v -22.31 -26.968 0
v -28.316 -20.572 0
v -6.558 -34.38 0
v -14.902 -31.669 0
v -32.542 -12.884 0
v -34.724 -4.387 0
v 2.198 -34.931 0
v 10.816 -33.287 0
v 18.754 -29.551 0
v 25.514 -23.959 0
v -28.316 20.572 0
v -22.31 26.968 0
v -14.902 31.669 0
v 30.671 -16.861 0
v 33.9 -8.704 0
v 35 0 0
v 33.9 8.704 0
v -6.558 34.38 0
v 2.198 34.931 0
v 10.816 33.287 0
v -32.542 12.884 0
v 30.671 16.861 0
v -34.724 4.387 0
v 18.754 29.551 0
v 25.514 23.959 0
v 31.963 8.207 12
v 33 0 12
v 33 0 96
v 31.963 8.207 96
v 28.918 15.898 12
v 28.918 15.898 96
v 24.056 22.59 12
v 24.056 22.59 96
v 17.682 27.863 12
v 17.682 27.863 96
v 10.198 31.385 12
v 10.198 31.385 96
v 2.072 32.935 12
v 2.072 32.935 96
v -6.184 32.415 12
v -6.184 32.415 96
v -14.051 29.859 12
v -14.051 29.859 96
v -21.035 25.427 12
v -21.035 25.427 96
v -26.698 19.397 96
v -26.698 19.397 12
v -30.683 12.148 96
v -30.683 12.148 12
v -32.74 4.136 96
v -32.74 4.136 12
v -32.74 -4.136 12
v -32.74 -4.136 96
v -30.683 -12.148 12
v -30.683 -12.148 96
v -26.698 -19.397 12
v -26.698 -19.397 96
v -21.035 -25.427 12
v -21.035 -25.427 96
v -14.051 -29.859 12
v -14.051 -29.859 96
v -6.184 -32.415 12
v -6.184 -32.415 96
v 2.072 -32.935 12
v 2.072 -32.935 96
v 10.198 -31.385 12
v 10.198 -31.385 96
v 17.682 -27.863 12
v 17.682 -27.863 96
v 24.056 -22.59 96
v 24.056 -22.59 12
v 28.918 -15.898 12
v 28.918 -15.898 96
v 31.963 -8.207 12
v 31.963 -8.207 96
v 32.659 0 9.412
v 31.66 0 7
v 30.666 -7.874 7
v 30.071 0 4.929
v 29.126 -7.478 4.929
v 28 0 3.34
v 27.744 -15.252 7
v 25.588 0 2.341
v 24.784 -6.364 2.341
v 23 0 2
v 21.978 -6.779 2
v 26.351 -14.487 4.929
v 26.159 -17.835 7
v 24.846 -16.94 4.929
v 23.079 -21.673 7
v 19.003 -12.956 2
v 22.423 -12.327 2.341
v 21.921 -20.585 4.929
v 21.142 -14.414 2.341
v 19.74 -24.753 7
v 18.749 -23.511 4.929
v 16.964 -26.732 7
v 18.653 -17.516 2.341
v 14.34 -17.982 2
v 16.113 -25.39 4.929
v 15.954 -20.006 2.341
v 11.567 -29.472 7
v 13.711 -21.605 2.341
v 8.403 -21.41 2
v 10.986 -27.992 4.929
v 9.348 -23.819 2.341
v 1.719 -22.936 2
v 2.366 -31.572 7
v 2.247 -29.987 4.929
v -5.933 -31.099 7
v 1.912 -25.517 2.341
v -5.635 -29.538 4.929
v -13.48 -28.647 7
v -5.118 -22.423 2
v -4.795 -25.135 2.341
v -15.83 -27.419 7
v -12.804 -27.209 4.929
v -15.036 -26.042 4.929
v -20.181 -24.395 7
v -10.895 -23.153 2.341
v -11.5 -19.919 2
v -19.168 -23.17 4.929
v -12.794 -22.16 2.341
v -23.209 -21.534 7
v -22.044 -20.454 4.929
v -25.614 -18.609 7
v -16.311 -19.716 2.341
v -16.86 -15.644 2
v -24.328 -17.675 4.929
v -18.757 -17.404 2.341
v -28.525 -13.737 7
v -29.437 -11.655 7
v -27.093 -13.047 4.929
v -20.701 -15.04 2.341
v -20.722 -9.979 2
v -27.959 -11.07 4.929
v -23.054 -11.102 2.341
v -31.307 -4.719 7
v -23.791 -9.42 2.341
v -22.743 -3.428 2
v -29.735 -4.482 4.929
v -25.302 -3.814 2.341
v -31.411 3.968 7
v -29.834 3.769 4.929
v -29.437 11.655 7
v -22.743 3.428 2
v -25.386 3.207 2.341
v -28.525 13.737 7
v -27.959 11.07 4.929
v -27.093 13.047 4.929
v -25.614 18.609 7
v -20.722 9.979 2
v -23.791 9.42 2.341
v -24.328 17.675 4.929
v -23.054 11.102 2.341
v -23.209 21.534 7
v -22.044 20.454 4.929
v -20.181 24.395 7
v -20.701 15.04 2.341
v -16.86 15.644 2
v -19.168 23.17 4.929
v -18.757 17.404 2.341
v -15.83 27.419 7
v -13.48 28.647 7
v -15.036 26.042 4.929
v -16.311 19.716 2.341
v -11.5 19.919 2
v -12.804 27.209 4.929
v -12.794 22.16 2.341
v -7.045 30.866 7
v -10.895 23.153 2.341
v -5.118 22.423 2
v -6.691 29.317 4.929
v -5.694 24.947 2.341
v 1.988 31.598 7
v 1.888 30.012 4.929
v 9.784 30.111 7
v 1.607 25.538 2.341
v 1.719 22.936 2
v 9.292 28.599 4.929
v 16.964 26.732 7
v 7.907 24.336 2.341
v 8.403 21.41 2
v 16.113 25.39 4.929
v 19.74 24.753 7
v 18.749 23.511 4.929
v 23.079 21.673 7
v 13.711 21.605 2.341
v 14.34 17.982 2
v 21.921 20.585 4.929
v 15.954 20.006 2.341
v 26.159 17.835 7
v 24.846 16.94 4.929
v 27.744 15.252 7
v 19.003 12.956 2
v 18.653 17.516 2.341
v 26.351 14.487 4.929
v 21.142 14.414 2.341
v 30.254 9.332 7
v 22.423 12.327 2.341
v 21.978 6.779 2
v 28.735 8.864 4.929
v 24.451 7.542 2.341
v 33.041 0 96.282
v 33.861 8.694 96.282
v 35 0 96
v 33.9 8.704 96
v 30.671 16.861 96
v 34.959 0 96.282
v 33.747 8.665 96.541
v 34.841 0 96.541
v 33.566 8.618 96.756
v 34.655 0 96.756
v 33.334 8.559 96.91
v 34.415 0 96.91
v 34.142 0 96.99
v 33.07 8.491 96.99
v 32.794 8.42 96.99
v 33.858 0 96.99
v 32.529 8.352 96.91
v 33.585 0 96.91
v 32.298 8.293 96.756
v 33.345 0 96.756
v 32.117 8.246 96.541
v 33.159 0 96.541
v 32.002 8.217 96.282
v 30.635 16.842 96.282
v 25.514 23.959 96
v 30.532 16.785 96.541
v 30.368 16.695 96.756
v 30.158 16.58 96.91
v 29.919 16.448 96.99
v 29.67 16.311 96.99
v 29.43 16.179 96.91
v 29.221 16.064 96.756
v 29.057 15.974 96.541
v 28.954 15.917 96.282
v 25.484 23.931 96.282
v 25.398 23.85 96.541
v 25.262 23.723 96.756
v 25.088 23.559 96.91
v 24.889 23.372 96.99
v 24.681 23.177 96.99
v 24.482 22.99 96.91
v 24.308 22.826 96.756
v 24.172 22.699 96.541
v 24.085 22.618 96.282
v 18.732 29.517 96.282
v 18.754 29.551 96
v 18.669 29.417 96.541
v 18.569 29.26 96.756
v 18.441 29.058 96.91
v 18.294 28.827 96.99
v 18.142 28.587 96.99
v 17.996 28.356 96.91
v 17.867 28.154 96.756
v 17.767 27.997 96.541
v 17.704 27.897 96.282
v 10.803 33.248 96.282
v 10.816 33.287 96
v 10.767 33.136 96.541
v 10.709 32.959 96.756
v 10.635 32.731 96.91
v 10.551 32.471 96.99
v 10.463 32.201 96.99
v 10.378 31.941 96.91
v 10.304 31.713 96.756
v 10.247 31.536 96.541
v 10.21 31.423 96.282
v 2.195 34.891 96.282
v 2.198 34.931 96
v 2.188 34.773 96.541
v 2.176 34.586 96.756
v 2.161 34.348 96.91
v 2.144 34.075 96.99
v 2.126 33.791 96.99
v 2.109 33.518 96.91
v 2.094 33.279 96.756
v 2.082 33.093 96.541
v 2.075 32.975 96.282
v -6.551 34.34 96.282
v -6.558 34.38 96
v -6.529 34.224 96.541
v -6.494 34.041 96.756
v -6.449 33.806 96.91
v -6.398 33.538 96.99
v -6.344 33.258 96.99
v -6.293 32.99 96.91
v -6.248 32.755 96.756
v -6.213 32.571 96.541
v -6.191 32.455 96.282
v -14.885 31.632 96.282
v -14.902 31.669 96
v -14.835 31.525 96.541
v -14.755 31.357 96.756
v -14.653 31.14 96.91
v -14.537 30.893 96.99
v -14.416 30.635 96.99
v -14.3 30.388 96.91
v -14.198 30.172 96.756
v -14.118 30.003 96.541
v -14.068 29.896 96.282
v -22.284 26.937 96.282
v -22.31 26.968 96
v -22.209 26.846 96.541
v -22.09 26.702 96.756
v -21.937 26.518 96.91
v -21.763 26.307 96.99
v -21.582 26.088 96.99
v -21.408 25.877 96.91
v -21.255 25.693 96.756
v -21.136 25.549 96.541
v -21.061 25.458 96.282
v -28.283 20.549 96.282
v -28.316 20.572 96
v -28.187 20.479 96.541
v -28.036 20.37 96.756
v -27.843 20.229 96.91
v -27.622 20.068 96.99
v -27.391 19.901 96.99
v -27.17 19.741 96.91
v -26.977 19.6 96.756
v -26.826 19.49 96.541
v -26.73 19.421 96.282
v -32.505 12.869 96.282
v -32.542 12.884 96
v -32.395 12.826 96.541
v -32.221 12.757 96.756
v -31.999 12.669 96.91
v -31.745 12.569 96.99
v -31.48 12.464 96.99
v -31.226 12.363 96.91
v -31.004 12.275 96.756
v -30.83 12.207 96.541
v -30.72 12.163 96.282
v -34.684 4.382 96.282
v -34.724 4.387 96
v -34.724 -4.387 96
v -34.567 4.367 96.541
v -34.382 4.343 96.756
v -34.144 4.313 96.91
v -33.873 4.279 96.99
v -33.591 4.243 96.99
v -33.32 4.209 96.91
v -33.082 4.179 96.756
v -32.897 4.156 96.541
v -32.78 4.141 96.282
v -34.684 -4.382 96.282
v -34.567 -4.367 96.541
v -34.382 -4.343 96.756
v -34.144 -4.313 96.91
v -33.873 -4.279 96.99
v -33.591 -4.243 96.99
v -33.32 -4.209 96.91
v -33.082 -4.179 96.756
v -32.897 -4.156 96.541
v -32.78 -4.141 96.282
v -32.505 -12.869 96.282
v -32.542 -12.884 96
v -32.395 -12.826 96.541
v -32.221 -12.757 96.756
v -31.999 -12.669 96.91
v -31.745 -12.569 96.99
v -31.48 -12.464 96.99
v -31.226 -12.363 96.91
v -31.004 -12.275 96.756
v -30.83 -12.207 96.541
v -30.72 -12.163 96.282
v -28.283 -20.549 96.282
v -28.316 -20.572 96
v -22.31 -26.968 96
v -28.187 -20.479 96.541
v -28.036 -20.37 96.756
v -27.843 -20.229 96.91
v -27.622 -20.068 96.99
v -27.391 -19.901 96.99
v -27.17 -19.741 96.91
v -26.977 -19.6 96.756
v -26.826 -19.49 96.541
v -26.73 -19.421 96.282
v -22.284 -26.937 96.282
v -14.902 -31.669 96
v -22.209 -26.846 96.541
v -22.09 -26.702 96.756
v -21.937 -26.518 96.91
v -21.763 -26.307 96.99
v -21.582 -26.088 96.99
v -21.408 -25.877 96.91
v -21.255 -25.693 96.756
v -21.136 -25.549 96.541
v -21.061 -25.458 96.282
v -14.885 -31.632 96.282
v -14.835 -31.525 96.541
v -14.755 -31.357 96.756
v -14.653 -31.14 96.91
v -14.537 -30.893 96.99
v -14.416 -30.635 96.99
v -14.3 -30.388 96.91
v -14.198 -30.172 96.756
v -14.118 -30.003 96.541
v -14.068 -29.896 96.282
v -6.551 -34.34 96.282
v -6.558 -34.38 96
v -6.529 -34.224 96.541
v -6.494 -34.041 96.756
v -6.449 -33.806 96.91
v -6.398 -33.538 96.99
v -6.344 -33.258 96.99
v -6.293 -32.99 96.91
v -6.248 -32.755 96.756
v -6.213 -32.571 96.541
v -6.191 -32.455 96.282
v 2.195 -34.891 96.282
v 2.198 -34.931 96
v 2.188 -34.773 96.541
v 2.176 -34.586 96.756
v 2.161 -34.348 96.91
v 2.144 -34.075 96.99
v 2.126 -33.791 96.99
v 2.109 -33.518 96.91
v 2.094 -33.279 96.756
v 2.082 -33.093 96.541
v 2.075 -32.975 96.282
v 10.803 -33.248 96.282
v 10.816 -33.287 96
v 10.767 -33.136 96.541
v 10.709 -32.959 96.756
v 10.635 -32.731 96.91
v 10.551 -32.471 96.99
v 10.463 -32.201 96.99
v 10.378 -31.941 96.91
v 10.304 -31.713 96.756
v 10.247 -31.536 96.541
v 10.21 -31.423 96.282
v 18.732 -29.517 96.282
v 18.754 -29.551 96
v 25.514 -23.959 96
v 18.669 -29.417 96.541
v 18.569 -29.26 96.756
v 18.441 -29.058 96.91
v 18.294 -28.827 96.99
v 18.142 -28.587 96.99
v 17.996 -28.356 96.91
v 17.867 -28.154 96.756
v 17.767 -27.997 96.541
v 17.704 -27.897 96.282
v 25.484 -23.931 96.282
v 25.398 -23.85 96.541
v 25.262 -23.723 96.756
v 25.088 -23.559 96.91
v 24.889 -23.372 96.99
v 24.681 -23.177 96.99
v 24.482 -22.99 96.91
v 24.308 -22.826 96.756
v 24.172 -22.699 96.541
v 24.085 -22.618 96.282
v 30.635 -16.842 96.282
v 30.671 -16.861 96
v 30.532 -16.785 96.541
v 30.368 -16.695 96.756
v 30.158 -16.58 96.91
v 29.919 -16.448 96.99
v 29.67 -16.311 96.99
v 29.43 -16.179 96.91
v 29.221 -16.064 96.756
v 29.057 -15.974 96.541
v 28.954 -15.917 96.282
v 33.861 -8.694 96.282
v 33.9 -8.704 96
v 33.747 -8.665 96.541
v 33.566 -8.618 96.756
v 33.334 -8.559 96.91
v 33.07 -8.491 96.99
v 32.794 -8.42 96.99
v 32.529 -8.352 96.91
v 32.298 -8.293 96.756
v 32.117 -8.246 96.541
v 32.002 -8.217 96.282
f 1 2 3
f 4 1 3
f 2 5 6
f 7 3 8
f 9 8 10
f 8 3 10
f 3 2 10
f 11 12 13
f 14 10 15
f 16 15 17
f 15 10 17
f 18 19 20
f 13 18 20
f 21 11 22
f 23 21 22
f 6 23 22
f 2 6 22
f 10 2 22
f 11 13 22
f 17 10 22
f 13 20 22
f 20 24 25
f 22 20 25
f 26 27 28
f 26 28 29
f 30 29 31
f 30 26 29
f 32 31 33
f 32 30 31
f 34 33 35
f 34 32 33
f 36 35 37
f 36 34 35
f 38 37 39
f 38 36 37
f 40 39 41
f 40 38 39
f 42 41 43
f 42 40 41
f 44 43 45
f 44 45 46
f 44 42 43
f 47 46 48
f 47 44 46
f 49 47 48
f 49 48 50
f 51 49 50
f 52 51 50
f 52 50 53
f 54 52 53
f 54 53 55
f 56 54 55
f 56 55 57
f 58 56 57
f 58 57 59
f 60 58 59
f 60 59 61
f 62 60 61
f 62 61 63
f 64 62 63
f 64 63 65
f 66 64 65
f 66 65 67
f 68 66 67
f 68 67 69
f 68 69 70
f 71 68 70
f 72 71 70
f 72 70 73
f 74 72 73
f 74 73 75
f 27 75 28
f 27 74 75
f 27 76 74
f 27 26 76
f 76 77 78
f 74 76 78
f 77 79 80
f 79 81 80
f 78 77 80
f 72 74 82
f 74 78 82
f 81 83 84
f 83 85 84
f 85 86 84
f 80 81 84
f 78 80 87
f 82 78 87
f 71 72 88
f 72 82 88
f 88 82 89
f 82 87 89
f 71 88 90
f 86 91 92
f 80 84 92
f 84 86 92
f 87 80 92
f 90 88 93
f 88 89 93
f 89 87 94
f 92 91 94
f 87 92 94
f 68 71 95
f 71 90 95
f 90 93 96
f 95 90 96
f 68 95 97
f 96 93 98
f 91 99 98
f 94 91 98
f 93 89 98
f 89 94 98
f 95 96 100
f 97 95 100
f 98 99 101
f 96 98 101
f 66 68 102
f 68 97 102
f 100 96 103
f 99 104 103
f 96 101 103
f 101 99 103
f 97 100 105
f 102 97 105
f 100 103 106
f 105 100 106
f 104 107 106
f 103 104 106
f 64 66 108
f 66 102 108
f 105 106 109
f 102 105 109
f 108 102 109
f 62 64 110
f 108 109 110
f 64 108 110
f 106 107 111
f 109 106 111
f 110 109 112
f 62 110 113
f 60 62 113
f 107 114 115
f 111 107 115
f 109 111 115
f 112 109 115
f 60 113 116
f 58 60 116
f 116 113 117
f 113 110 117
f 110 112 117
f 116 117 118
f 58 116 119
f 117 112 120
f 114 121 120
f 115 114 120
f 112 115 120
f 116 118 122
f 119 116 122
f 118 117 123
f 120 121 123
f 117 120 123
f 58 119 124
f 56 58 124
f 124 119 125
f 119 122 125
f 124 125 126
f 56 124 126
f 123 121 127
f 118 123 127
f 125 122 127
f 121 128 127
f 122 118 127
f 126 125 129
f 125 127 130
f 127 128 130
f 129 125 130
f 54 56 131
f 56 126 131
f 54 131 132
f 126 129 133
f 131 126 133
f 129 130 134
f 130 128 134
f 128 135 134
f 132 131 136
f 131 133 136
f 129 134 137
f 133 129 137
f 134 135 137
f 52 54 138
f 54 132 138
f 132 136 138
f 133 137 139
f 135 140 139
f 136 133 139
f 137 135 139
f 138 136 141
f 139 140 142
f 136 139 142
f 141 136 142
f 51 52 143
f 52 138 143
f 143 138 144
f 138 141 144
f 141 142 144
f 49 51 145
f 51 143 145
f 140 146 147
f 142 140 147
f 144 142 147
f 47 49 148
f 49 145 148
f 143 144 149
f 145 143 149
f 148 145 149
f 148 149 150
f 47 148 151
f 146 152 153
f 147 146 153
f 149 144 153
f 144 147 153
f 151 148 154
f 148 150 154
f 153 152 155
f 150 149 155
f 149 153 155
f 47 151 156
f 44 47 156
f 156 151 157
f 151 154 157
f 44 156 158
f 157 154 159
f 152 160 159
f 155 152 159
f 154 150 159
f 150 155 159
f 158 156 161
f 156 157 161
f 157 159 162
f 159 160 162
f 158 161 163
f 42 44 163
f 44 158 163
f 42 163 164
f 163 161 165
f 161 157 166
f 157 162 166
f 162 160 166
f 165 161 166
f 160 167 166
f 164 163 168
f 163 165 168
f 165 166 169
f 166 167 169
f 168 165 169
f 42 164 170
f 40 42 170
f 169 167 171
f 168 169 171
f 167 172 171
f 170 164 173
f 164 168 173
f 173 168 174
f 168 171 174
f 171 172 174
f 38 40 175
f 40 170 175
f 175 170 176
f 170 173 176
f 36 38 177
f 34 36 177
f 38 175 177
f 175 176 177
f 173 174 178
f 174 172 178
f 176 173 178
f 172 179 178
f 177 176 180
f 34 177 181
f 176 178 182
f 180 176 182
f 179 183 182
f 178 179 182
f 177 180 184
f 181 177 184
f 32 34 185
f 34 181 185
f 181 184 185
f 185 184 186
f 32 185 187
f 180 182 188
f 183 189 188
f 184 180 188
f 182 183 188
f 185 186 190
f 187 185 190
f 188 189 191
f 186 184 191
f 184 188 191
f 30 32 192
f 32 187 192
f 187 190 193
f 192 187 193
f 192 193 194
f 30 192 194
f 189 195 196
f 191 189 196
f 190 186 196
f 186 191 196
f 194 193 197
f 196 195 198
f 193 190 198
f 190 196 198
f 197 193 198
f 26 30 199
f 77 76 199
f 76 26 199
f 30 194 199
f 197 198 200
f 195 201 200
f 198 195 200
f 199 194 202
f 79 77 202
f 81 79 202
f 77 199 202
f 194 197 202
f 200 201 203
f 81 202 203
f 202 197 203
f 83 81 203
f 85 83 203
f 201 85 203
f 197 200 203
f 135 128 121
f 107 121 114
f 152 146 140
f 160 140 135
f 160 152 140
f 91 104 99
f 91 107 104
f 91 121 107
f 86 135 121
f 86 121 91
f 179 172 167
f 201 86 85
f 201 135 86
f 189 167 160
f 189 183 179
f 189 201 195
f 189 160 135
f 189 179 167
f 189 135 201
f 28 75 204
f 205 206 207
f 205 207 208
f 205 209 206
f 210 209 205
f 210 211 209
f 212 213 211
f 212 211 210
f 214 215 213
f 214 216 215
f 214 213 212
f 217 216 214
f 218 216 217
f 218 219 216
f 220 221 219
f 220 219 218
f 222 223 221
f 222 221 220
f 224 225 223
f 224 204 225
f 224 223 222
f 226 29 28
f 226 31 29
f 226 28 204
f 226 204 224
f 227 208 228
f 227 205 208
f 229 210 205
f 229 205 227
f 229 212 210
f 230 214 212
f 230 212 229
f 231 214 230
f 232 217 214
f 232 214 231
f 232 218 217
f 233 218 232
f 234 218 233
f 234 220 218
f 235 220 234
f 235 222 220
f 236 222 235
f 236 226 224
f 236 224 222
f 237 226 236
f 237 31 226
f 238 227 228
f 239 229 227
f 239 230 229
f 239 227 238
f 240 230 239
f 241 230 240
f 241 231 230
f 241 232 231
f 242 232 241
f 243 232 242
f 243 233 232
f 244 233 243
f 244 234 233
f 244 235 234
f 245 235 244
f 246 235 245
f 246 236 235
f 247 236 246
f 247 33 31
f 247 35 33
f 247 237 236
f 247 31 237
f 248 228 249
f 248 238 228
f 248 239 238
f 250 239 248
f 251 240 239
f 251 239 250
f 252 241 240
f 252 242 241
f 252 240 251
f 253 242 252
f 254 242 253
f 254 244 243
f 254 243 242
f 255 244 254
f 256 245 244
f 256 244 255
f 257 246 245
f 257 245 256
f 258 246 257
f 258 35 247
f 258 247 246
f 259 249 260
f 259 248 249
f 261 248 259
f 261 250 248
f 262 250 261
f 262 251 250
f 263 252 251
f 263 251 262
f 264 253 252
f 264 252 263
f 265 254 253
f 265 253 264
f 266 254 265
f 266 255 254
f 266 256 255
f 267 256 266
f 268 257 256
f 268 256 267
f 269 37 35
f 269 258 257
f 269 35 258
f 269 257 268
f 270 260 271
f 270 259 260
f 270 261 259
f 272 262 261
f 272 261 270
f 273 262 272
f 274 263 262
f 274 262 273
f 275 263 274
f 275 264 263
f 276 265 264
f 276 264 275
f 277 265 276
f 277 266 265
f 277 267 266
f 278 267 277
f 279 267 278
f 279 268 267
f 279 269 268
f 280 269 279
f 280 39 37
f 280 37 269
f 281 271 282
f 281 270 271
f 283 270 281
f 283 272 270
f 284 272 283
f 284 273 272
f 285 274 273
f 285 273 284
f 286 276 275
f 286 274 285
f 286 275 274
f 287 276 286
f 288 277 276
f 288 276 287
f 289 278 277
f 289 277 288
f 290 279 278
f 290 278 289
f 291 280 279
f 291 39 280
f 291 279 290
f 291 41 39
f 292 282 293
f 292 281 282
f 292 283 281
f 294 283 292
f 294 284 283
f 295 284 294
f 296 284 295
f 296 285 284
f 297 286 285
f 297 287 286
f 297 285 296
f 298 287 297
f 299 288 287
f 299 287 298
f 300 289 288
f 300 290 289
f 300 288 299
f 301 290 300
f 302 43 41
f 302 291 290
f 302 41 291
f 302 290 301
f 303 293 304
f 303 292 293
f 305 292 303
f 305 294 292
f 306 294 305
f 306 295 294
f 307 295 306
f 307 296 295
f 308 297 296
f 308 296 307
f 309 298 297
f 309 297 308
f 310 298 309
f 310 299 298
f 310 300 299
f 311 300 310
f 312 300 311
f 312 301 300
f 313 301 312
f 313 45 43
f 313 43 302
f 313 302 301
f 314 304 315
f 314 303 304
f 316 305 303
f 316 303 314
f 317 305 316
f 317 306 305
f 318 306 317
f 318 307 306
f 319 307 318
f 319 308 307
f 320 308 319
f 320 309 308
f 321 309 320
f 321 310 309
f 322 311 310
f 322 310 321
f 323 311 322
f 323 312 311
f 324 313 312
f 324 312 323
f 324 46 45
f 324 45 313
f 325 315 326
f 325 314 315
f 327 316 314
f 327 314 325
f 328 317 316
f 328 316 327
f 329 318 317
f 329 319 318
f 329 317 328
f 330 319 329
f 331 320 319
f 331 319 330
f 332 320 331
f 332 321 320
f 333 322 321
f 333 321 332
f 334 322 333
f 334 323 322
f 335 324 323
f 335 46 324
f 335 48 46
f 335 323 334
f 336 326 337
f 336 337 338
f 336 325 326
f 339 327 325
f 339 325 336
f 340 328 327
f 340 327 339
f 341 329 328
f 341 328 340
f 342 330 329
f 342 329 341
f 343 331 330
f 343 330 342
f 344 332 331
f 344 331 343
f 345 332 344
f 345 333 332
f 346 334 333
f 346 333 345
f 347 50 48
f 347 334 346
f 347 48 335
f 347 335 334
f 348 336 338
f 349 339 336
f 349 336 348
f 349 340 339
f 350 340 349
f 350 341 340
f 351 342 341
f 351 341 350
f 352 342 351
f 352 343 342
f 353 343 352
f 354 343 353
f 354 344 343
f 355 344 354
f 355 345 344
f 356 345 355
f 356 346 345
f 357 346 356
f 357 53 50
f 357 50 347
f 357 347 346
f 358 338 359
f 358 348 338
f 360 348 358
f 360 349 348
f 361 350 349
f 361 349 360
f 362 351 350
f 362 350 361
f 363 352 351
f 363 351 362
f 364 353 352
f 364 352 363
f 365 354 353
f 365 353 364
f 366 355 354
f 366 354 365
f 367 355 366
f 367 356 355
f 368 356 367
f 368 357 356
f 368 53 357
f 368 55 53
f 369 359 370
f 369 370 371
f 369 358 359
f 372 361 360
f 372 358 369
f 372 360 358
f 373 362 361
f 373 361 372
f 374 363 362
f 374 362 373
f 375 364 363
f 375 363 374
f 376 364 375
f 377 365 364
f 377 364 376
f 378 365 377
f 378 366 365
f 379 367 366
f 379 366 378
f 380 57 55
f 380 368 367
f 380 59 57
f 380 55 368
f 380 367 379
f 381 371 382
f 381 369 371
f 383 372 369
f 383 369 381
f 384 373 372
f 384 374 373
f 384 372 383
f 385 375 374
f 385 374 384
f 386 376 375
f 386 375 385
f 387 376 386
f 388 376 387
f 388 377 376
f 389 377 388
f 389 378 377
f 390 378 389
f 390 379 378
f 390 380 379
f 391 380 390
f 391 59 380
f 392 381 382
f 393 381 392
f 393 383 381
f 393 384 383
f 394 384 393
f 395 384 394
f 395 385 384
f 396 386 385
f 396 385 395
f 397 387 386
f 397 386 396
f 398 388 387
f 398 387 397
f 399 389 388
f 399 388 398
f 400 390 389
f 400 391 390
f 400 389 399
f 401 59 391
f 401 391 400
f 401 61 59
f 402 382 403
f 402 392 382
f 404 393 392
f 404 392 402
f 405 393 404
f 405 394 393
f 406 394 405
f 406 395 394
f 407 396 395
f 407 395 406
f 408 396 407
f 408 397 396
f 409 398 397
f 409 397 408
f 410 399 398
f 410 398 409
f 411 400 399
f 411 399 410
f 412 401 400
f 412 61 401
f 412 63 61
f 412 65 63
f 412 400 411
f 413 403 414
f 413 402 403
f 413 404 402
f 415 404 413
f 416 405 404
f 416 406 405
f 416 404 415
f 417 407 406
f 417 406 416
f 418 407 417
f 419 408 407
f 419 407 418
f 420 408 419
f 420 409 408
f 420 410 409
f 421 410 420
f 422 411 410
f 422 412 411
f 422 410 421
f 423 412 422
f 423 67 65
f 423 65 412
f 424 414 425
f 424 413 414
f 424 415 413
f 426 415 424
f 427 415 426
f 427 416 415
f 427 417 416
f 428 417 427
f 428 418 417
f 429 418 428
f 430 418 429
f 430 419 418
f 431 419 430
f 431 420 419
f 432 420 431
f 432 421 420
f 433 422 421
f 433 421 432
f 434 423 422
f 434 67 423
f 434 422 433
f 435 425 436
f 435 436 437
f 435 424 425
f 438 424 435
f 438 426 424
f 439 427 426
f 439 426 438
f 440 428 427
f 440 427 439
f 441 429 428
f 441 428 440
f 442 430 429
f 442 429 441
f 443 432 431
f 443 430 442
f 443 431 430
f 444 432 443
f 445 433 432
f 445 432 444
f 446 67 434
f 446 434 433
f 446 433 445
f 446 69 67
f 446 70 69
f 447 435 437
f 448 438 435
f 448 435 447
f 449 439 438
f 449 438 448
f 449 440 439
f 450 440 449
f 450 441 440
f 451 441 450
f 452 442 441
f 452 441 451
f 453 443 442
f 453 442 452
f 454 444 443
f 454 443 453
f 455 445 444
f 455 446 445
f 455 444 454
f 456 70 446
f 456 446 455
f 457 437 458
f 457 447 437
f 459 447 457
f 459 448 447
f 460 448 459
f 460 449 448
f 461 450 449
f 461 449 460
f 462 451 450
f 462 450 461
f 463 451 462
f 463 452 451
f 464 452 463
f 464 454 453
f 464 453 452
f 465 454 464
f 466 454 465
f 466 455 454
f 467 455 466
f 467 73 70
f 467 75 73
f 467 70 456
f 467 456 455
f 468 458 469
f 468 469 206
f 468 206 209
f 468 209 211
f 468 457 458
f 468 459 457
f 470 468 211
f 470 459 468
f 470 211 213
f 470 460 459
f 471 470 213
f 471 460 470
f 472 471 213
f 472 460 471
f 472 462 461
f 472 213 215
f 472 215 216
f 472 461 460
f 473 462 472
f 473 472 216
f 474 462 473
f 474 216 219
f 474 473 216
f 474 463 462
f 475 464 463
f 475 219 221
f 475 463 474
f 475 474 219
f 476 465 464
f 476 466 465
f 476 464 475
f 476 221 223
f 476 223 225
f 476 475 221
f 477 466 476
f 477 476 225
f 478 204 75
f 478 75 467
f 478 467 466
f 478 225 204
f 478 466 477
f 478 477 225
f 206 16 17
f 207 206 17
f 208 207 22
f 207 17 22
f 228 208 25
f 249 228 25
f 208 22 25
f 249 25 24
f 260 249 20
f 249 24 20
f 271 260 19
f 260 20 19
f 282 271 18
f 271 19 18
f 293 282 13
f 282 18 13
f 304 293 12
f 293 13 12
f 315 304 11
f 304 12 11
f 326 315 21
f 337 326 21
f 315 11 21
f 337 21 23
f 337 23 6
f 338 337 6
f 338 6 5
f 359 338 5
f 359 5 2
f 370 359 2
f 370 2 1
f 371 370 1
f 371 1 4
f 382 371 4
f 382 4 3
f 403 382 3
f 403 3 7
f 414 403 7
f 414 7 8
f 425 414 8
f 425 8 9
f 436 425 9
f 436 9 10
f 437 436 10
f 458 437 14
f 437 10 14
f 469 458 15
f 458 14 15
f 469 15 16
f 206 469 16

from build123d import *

# Parameters (mm, degrees)
F0_R     = 35
F1_DEPTH = 100
F2_T     = -2
F5_R     = 10


# Not quite as in the source:
# - a fillet or chamfer that OpenCascade refuses, or shapes differently, is made with other operations: its cross-section is extruded or revolved along the edge and cut away or added


with BuildPart() as f1:
    # F0 (on Top) → F1 (new body)
    with BuildSketch(Plane.XY):
        Circle(F0_R)
    extrude(amount=F1_DEPTH)

    # F2
    f2_openings = [f1.faces().sort_by_distance(p)[0] for p in [
        (0, 0, 100),
    ]]
    offset(amount=F2_T, openings=f2_openings)

    # F3: fillet of radius 5 on 1 edges, made by hand

    # F3_s1 → F3_t2 (revolve, cut)
    with BuildSketch(Plane.XZ):
        with BuildLine():
            ThreePointArc((35, 96), (34.472135955, 98.2360679775), (33, 100))
            Line((33, 100), (35, 100))
            Line((35, 100), (35, 96))
        make_face()
    revolve(axis=Axis((0, 0, 100), (0, 0, 1)), mode=Mode.SUBTRACT)

    # F4: fillet of radius 1 on 1 edges, made by hand

    # F4_s1 → F4_t2 (revolve, cut)
    with BuildSketch(Plane.XZ):
        with BuildLine():
            ThreePointArc((35, 96.0000100581), (33.9999989942, 97.0000080465), (33, 96.0000080465))
            Line((33, 96.0000080465), (33, 100))
            ThreePointArc((33, 100), (34.4721337059, 98.2360724756), (35, 96.0000100581))
        make_face()
    revolve(axis=Axis((0, 0, 100), (0, 0, 1)), mode=Mode.SUBTRACT)

    # F5
    f5_edges = [f1.edges().sort_by_distance(p)[0] for p in [
        (-33, 0, 2),
    ]]
    fillet(f5_edges, radius=F5_R)


solid = f1.part
